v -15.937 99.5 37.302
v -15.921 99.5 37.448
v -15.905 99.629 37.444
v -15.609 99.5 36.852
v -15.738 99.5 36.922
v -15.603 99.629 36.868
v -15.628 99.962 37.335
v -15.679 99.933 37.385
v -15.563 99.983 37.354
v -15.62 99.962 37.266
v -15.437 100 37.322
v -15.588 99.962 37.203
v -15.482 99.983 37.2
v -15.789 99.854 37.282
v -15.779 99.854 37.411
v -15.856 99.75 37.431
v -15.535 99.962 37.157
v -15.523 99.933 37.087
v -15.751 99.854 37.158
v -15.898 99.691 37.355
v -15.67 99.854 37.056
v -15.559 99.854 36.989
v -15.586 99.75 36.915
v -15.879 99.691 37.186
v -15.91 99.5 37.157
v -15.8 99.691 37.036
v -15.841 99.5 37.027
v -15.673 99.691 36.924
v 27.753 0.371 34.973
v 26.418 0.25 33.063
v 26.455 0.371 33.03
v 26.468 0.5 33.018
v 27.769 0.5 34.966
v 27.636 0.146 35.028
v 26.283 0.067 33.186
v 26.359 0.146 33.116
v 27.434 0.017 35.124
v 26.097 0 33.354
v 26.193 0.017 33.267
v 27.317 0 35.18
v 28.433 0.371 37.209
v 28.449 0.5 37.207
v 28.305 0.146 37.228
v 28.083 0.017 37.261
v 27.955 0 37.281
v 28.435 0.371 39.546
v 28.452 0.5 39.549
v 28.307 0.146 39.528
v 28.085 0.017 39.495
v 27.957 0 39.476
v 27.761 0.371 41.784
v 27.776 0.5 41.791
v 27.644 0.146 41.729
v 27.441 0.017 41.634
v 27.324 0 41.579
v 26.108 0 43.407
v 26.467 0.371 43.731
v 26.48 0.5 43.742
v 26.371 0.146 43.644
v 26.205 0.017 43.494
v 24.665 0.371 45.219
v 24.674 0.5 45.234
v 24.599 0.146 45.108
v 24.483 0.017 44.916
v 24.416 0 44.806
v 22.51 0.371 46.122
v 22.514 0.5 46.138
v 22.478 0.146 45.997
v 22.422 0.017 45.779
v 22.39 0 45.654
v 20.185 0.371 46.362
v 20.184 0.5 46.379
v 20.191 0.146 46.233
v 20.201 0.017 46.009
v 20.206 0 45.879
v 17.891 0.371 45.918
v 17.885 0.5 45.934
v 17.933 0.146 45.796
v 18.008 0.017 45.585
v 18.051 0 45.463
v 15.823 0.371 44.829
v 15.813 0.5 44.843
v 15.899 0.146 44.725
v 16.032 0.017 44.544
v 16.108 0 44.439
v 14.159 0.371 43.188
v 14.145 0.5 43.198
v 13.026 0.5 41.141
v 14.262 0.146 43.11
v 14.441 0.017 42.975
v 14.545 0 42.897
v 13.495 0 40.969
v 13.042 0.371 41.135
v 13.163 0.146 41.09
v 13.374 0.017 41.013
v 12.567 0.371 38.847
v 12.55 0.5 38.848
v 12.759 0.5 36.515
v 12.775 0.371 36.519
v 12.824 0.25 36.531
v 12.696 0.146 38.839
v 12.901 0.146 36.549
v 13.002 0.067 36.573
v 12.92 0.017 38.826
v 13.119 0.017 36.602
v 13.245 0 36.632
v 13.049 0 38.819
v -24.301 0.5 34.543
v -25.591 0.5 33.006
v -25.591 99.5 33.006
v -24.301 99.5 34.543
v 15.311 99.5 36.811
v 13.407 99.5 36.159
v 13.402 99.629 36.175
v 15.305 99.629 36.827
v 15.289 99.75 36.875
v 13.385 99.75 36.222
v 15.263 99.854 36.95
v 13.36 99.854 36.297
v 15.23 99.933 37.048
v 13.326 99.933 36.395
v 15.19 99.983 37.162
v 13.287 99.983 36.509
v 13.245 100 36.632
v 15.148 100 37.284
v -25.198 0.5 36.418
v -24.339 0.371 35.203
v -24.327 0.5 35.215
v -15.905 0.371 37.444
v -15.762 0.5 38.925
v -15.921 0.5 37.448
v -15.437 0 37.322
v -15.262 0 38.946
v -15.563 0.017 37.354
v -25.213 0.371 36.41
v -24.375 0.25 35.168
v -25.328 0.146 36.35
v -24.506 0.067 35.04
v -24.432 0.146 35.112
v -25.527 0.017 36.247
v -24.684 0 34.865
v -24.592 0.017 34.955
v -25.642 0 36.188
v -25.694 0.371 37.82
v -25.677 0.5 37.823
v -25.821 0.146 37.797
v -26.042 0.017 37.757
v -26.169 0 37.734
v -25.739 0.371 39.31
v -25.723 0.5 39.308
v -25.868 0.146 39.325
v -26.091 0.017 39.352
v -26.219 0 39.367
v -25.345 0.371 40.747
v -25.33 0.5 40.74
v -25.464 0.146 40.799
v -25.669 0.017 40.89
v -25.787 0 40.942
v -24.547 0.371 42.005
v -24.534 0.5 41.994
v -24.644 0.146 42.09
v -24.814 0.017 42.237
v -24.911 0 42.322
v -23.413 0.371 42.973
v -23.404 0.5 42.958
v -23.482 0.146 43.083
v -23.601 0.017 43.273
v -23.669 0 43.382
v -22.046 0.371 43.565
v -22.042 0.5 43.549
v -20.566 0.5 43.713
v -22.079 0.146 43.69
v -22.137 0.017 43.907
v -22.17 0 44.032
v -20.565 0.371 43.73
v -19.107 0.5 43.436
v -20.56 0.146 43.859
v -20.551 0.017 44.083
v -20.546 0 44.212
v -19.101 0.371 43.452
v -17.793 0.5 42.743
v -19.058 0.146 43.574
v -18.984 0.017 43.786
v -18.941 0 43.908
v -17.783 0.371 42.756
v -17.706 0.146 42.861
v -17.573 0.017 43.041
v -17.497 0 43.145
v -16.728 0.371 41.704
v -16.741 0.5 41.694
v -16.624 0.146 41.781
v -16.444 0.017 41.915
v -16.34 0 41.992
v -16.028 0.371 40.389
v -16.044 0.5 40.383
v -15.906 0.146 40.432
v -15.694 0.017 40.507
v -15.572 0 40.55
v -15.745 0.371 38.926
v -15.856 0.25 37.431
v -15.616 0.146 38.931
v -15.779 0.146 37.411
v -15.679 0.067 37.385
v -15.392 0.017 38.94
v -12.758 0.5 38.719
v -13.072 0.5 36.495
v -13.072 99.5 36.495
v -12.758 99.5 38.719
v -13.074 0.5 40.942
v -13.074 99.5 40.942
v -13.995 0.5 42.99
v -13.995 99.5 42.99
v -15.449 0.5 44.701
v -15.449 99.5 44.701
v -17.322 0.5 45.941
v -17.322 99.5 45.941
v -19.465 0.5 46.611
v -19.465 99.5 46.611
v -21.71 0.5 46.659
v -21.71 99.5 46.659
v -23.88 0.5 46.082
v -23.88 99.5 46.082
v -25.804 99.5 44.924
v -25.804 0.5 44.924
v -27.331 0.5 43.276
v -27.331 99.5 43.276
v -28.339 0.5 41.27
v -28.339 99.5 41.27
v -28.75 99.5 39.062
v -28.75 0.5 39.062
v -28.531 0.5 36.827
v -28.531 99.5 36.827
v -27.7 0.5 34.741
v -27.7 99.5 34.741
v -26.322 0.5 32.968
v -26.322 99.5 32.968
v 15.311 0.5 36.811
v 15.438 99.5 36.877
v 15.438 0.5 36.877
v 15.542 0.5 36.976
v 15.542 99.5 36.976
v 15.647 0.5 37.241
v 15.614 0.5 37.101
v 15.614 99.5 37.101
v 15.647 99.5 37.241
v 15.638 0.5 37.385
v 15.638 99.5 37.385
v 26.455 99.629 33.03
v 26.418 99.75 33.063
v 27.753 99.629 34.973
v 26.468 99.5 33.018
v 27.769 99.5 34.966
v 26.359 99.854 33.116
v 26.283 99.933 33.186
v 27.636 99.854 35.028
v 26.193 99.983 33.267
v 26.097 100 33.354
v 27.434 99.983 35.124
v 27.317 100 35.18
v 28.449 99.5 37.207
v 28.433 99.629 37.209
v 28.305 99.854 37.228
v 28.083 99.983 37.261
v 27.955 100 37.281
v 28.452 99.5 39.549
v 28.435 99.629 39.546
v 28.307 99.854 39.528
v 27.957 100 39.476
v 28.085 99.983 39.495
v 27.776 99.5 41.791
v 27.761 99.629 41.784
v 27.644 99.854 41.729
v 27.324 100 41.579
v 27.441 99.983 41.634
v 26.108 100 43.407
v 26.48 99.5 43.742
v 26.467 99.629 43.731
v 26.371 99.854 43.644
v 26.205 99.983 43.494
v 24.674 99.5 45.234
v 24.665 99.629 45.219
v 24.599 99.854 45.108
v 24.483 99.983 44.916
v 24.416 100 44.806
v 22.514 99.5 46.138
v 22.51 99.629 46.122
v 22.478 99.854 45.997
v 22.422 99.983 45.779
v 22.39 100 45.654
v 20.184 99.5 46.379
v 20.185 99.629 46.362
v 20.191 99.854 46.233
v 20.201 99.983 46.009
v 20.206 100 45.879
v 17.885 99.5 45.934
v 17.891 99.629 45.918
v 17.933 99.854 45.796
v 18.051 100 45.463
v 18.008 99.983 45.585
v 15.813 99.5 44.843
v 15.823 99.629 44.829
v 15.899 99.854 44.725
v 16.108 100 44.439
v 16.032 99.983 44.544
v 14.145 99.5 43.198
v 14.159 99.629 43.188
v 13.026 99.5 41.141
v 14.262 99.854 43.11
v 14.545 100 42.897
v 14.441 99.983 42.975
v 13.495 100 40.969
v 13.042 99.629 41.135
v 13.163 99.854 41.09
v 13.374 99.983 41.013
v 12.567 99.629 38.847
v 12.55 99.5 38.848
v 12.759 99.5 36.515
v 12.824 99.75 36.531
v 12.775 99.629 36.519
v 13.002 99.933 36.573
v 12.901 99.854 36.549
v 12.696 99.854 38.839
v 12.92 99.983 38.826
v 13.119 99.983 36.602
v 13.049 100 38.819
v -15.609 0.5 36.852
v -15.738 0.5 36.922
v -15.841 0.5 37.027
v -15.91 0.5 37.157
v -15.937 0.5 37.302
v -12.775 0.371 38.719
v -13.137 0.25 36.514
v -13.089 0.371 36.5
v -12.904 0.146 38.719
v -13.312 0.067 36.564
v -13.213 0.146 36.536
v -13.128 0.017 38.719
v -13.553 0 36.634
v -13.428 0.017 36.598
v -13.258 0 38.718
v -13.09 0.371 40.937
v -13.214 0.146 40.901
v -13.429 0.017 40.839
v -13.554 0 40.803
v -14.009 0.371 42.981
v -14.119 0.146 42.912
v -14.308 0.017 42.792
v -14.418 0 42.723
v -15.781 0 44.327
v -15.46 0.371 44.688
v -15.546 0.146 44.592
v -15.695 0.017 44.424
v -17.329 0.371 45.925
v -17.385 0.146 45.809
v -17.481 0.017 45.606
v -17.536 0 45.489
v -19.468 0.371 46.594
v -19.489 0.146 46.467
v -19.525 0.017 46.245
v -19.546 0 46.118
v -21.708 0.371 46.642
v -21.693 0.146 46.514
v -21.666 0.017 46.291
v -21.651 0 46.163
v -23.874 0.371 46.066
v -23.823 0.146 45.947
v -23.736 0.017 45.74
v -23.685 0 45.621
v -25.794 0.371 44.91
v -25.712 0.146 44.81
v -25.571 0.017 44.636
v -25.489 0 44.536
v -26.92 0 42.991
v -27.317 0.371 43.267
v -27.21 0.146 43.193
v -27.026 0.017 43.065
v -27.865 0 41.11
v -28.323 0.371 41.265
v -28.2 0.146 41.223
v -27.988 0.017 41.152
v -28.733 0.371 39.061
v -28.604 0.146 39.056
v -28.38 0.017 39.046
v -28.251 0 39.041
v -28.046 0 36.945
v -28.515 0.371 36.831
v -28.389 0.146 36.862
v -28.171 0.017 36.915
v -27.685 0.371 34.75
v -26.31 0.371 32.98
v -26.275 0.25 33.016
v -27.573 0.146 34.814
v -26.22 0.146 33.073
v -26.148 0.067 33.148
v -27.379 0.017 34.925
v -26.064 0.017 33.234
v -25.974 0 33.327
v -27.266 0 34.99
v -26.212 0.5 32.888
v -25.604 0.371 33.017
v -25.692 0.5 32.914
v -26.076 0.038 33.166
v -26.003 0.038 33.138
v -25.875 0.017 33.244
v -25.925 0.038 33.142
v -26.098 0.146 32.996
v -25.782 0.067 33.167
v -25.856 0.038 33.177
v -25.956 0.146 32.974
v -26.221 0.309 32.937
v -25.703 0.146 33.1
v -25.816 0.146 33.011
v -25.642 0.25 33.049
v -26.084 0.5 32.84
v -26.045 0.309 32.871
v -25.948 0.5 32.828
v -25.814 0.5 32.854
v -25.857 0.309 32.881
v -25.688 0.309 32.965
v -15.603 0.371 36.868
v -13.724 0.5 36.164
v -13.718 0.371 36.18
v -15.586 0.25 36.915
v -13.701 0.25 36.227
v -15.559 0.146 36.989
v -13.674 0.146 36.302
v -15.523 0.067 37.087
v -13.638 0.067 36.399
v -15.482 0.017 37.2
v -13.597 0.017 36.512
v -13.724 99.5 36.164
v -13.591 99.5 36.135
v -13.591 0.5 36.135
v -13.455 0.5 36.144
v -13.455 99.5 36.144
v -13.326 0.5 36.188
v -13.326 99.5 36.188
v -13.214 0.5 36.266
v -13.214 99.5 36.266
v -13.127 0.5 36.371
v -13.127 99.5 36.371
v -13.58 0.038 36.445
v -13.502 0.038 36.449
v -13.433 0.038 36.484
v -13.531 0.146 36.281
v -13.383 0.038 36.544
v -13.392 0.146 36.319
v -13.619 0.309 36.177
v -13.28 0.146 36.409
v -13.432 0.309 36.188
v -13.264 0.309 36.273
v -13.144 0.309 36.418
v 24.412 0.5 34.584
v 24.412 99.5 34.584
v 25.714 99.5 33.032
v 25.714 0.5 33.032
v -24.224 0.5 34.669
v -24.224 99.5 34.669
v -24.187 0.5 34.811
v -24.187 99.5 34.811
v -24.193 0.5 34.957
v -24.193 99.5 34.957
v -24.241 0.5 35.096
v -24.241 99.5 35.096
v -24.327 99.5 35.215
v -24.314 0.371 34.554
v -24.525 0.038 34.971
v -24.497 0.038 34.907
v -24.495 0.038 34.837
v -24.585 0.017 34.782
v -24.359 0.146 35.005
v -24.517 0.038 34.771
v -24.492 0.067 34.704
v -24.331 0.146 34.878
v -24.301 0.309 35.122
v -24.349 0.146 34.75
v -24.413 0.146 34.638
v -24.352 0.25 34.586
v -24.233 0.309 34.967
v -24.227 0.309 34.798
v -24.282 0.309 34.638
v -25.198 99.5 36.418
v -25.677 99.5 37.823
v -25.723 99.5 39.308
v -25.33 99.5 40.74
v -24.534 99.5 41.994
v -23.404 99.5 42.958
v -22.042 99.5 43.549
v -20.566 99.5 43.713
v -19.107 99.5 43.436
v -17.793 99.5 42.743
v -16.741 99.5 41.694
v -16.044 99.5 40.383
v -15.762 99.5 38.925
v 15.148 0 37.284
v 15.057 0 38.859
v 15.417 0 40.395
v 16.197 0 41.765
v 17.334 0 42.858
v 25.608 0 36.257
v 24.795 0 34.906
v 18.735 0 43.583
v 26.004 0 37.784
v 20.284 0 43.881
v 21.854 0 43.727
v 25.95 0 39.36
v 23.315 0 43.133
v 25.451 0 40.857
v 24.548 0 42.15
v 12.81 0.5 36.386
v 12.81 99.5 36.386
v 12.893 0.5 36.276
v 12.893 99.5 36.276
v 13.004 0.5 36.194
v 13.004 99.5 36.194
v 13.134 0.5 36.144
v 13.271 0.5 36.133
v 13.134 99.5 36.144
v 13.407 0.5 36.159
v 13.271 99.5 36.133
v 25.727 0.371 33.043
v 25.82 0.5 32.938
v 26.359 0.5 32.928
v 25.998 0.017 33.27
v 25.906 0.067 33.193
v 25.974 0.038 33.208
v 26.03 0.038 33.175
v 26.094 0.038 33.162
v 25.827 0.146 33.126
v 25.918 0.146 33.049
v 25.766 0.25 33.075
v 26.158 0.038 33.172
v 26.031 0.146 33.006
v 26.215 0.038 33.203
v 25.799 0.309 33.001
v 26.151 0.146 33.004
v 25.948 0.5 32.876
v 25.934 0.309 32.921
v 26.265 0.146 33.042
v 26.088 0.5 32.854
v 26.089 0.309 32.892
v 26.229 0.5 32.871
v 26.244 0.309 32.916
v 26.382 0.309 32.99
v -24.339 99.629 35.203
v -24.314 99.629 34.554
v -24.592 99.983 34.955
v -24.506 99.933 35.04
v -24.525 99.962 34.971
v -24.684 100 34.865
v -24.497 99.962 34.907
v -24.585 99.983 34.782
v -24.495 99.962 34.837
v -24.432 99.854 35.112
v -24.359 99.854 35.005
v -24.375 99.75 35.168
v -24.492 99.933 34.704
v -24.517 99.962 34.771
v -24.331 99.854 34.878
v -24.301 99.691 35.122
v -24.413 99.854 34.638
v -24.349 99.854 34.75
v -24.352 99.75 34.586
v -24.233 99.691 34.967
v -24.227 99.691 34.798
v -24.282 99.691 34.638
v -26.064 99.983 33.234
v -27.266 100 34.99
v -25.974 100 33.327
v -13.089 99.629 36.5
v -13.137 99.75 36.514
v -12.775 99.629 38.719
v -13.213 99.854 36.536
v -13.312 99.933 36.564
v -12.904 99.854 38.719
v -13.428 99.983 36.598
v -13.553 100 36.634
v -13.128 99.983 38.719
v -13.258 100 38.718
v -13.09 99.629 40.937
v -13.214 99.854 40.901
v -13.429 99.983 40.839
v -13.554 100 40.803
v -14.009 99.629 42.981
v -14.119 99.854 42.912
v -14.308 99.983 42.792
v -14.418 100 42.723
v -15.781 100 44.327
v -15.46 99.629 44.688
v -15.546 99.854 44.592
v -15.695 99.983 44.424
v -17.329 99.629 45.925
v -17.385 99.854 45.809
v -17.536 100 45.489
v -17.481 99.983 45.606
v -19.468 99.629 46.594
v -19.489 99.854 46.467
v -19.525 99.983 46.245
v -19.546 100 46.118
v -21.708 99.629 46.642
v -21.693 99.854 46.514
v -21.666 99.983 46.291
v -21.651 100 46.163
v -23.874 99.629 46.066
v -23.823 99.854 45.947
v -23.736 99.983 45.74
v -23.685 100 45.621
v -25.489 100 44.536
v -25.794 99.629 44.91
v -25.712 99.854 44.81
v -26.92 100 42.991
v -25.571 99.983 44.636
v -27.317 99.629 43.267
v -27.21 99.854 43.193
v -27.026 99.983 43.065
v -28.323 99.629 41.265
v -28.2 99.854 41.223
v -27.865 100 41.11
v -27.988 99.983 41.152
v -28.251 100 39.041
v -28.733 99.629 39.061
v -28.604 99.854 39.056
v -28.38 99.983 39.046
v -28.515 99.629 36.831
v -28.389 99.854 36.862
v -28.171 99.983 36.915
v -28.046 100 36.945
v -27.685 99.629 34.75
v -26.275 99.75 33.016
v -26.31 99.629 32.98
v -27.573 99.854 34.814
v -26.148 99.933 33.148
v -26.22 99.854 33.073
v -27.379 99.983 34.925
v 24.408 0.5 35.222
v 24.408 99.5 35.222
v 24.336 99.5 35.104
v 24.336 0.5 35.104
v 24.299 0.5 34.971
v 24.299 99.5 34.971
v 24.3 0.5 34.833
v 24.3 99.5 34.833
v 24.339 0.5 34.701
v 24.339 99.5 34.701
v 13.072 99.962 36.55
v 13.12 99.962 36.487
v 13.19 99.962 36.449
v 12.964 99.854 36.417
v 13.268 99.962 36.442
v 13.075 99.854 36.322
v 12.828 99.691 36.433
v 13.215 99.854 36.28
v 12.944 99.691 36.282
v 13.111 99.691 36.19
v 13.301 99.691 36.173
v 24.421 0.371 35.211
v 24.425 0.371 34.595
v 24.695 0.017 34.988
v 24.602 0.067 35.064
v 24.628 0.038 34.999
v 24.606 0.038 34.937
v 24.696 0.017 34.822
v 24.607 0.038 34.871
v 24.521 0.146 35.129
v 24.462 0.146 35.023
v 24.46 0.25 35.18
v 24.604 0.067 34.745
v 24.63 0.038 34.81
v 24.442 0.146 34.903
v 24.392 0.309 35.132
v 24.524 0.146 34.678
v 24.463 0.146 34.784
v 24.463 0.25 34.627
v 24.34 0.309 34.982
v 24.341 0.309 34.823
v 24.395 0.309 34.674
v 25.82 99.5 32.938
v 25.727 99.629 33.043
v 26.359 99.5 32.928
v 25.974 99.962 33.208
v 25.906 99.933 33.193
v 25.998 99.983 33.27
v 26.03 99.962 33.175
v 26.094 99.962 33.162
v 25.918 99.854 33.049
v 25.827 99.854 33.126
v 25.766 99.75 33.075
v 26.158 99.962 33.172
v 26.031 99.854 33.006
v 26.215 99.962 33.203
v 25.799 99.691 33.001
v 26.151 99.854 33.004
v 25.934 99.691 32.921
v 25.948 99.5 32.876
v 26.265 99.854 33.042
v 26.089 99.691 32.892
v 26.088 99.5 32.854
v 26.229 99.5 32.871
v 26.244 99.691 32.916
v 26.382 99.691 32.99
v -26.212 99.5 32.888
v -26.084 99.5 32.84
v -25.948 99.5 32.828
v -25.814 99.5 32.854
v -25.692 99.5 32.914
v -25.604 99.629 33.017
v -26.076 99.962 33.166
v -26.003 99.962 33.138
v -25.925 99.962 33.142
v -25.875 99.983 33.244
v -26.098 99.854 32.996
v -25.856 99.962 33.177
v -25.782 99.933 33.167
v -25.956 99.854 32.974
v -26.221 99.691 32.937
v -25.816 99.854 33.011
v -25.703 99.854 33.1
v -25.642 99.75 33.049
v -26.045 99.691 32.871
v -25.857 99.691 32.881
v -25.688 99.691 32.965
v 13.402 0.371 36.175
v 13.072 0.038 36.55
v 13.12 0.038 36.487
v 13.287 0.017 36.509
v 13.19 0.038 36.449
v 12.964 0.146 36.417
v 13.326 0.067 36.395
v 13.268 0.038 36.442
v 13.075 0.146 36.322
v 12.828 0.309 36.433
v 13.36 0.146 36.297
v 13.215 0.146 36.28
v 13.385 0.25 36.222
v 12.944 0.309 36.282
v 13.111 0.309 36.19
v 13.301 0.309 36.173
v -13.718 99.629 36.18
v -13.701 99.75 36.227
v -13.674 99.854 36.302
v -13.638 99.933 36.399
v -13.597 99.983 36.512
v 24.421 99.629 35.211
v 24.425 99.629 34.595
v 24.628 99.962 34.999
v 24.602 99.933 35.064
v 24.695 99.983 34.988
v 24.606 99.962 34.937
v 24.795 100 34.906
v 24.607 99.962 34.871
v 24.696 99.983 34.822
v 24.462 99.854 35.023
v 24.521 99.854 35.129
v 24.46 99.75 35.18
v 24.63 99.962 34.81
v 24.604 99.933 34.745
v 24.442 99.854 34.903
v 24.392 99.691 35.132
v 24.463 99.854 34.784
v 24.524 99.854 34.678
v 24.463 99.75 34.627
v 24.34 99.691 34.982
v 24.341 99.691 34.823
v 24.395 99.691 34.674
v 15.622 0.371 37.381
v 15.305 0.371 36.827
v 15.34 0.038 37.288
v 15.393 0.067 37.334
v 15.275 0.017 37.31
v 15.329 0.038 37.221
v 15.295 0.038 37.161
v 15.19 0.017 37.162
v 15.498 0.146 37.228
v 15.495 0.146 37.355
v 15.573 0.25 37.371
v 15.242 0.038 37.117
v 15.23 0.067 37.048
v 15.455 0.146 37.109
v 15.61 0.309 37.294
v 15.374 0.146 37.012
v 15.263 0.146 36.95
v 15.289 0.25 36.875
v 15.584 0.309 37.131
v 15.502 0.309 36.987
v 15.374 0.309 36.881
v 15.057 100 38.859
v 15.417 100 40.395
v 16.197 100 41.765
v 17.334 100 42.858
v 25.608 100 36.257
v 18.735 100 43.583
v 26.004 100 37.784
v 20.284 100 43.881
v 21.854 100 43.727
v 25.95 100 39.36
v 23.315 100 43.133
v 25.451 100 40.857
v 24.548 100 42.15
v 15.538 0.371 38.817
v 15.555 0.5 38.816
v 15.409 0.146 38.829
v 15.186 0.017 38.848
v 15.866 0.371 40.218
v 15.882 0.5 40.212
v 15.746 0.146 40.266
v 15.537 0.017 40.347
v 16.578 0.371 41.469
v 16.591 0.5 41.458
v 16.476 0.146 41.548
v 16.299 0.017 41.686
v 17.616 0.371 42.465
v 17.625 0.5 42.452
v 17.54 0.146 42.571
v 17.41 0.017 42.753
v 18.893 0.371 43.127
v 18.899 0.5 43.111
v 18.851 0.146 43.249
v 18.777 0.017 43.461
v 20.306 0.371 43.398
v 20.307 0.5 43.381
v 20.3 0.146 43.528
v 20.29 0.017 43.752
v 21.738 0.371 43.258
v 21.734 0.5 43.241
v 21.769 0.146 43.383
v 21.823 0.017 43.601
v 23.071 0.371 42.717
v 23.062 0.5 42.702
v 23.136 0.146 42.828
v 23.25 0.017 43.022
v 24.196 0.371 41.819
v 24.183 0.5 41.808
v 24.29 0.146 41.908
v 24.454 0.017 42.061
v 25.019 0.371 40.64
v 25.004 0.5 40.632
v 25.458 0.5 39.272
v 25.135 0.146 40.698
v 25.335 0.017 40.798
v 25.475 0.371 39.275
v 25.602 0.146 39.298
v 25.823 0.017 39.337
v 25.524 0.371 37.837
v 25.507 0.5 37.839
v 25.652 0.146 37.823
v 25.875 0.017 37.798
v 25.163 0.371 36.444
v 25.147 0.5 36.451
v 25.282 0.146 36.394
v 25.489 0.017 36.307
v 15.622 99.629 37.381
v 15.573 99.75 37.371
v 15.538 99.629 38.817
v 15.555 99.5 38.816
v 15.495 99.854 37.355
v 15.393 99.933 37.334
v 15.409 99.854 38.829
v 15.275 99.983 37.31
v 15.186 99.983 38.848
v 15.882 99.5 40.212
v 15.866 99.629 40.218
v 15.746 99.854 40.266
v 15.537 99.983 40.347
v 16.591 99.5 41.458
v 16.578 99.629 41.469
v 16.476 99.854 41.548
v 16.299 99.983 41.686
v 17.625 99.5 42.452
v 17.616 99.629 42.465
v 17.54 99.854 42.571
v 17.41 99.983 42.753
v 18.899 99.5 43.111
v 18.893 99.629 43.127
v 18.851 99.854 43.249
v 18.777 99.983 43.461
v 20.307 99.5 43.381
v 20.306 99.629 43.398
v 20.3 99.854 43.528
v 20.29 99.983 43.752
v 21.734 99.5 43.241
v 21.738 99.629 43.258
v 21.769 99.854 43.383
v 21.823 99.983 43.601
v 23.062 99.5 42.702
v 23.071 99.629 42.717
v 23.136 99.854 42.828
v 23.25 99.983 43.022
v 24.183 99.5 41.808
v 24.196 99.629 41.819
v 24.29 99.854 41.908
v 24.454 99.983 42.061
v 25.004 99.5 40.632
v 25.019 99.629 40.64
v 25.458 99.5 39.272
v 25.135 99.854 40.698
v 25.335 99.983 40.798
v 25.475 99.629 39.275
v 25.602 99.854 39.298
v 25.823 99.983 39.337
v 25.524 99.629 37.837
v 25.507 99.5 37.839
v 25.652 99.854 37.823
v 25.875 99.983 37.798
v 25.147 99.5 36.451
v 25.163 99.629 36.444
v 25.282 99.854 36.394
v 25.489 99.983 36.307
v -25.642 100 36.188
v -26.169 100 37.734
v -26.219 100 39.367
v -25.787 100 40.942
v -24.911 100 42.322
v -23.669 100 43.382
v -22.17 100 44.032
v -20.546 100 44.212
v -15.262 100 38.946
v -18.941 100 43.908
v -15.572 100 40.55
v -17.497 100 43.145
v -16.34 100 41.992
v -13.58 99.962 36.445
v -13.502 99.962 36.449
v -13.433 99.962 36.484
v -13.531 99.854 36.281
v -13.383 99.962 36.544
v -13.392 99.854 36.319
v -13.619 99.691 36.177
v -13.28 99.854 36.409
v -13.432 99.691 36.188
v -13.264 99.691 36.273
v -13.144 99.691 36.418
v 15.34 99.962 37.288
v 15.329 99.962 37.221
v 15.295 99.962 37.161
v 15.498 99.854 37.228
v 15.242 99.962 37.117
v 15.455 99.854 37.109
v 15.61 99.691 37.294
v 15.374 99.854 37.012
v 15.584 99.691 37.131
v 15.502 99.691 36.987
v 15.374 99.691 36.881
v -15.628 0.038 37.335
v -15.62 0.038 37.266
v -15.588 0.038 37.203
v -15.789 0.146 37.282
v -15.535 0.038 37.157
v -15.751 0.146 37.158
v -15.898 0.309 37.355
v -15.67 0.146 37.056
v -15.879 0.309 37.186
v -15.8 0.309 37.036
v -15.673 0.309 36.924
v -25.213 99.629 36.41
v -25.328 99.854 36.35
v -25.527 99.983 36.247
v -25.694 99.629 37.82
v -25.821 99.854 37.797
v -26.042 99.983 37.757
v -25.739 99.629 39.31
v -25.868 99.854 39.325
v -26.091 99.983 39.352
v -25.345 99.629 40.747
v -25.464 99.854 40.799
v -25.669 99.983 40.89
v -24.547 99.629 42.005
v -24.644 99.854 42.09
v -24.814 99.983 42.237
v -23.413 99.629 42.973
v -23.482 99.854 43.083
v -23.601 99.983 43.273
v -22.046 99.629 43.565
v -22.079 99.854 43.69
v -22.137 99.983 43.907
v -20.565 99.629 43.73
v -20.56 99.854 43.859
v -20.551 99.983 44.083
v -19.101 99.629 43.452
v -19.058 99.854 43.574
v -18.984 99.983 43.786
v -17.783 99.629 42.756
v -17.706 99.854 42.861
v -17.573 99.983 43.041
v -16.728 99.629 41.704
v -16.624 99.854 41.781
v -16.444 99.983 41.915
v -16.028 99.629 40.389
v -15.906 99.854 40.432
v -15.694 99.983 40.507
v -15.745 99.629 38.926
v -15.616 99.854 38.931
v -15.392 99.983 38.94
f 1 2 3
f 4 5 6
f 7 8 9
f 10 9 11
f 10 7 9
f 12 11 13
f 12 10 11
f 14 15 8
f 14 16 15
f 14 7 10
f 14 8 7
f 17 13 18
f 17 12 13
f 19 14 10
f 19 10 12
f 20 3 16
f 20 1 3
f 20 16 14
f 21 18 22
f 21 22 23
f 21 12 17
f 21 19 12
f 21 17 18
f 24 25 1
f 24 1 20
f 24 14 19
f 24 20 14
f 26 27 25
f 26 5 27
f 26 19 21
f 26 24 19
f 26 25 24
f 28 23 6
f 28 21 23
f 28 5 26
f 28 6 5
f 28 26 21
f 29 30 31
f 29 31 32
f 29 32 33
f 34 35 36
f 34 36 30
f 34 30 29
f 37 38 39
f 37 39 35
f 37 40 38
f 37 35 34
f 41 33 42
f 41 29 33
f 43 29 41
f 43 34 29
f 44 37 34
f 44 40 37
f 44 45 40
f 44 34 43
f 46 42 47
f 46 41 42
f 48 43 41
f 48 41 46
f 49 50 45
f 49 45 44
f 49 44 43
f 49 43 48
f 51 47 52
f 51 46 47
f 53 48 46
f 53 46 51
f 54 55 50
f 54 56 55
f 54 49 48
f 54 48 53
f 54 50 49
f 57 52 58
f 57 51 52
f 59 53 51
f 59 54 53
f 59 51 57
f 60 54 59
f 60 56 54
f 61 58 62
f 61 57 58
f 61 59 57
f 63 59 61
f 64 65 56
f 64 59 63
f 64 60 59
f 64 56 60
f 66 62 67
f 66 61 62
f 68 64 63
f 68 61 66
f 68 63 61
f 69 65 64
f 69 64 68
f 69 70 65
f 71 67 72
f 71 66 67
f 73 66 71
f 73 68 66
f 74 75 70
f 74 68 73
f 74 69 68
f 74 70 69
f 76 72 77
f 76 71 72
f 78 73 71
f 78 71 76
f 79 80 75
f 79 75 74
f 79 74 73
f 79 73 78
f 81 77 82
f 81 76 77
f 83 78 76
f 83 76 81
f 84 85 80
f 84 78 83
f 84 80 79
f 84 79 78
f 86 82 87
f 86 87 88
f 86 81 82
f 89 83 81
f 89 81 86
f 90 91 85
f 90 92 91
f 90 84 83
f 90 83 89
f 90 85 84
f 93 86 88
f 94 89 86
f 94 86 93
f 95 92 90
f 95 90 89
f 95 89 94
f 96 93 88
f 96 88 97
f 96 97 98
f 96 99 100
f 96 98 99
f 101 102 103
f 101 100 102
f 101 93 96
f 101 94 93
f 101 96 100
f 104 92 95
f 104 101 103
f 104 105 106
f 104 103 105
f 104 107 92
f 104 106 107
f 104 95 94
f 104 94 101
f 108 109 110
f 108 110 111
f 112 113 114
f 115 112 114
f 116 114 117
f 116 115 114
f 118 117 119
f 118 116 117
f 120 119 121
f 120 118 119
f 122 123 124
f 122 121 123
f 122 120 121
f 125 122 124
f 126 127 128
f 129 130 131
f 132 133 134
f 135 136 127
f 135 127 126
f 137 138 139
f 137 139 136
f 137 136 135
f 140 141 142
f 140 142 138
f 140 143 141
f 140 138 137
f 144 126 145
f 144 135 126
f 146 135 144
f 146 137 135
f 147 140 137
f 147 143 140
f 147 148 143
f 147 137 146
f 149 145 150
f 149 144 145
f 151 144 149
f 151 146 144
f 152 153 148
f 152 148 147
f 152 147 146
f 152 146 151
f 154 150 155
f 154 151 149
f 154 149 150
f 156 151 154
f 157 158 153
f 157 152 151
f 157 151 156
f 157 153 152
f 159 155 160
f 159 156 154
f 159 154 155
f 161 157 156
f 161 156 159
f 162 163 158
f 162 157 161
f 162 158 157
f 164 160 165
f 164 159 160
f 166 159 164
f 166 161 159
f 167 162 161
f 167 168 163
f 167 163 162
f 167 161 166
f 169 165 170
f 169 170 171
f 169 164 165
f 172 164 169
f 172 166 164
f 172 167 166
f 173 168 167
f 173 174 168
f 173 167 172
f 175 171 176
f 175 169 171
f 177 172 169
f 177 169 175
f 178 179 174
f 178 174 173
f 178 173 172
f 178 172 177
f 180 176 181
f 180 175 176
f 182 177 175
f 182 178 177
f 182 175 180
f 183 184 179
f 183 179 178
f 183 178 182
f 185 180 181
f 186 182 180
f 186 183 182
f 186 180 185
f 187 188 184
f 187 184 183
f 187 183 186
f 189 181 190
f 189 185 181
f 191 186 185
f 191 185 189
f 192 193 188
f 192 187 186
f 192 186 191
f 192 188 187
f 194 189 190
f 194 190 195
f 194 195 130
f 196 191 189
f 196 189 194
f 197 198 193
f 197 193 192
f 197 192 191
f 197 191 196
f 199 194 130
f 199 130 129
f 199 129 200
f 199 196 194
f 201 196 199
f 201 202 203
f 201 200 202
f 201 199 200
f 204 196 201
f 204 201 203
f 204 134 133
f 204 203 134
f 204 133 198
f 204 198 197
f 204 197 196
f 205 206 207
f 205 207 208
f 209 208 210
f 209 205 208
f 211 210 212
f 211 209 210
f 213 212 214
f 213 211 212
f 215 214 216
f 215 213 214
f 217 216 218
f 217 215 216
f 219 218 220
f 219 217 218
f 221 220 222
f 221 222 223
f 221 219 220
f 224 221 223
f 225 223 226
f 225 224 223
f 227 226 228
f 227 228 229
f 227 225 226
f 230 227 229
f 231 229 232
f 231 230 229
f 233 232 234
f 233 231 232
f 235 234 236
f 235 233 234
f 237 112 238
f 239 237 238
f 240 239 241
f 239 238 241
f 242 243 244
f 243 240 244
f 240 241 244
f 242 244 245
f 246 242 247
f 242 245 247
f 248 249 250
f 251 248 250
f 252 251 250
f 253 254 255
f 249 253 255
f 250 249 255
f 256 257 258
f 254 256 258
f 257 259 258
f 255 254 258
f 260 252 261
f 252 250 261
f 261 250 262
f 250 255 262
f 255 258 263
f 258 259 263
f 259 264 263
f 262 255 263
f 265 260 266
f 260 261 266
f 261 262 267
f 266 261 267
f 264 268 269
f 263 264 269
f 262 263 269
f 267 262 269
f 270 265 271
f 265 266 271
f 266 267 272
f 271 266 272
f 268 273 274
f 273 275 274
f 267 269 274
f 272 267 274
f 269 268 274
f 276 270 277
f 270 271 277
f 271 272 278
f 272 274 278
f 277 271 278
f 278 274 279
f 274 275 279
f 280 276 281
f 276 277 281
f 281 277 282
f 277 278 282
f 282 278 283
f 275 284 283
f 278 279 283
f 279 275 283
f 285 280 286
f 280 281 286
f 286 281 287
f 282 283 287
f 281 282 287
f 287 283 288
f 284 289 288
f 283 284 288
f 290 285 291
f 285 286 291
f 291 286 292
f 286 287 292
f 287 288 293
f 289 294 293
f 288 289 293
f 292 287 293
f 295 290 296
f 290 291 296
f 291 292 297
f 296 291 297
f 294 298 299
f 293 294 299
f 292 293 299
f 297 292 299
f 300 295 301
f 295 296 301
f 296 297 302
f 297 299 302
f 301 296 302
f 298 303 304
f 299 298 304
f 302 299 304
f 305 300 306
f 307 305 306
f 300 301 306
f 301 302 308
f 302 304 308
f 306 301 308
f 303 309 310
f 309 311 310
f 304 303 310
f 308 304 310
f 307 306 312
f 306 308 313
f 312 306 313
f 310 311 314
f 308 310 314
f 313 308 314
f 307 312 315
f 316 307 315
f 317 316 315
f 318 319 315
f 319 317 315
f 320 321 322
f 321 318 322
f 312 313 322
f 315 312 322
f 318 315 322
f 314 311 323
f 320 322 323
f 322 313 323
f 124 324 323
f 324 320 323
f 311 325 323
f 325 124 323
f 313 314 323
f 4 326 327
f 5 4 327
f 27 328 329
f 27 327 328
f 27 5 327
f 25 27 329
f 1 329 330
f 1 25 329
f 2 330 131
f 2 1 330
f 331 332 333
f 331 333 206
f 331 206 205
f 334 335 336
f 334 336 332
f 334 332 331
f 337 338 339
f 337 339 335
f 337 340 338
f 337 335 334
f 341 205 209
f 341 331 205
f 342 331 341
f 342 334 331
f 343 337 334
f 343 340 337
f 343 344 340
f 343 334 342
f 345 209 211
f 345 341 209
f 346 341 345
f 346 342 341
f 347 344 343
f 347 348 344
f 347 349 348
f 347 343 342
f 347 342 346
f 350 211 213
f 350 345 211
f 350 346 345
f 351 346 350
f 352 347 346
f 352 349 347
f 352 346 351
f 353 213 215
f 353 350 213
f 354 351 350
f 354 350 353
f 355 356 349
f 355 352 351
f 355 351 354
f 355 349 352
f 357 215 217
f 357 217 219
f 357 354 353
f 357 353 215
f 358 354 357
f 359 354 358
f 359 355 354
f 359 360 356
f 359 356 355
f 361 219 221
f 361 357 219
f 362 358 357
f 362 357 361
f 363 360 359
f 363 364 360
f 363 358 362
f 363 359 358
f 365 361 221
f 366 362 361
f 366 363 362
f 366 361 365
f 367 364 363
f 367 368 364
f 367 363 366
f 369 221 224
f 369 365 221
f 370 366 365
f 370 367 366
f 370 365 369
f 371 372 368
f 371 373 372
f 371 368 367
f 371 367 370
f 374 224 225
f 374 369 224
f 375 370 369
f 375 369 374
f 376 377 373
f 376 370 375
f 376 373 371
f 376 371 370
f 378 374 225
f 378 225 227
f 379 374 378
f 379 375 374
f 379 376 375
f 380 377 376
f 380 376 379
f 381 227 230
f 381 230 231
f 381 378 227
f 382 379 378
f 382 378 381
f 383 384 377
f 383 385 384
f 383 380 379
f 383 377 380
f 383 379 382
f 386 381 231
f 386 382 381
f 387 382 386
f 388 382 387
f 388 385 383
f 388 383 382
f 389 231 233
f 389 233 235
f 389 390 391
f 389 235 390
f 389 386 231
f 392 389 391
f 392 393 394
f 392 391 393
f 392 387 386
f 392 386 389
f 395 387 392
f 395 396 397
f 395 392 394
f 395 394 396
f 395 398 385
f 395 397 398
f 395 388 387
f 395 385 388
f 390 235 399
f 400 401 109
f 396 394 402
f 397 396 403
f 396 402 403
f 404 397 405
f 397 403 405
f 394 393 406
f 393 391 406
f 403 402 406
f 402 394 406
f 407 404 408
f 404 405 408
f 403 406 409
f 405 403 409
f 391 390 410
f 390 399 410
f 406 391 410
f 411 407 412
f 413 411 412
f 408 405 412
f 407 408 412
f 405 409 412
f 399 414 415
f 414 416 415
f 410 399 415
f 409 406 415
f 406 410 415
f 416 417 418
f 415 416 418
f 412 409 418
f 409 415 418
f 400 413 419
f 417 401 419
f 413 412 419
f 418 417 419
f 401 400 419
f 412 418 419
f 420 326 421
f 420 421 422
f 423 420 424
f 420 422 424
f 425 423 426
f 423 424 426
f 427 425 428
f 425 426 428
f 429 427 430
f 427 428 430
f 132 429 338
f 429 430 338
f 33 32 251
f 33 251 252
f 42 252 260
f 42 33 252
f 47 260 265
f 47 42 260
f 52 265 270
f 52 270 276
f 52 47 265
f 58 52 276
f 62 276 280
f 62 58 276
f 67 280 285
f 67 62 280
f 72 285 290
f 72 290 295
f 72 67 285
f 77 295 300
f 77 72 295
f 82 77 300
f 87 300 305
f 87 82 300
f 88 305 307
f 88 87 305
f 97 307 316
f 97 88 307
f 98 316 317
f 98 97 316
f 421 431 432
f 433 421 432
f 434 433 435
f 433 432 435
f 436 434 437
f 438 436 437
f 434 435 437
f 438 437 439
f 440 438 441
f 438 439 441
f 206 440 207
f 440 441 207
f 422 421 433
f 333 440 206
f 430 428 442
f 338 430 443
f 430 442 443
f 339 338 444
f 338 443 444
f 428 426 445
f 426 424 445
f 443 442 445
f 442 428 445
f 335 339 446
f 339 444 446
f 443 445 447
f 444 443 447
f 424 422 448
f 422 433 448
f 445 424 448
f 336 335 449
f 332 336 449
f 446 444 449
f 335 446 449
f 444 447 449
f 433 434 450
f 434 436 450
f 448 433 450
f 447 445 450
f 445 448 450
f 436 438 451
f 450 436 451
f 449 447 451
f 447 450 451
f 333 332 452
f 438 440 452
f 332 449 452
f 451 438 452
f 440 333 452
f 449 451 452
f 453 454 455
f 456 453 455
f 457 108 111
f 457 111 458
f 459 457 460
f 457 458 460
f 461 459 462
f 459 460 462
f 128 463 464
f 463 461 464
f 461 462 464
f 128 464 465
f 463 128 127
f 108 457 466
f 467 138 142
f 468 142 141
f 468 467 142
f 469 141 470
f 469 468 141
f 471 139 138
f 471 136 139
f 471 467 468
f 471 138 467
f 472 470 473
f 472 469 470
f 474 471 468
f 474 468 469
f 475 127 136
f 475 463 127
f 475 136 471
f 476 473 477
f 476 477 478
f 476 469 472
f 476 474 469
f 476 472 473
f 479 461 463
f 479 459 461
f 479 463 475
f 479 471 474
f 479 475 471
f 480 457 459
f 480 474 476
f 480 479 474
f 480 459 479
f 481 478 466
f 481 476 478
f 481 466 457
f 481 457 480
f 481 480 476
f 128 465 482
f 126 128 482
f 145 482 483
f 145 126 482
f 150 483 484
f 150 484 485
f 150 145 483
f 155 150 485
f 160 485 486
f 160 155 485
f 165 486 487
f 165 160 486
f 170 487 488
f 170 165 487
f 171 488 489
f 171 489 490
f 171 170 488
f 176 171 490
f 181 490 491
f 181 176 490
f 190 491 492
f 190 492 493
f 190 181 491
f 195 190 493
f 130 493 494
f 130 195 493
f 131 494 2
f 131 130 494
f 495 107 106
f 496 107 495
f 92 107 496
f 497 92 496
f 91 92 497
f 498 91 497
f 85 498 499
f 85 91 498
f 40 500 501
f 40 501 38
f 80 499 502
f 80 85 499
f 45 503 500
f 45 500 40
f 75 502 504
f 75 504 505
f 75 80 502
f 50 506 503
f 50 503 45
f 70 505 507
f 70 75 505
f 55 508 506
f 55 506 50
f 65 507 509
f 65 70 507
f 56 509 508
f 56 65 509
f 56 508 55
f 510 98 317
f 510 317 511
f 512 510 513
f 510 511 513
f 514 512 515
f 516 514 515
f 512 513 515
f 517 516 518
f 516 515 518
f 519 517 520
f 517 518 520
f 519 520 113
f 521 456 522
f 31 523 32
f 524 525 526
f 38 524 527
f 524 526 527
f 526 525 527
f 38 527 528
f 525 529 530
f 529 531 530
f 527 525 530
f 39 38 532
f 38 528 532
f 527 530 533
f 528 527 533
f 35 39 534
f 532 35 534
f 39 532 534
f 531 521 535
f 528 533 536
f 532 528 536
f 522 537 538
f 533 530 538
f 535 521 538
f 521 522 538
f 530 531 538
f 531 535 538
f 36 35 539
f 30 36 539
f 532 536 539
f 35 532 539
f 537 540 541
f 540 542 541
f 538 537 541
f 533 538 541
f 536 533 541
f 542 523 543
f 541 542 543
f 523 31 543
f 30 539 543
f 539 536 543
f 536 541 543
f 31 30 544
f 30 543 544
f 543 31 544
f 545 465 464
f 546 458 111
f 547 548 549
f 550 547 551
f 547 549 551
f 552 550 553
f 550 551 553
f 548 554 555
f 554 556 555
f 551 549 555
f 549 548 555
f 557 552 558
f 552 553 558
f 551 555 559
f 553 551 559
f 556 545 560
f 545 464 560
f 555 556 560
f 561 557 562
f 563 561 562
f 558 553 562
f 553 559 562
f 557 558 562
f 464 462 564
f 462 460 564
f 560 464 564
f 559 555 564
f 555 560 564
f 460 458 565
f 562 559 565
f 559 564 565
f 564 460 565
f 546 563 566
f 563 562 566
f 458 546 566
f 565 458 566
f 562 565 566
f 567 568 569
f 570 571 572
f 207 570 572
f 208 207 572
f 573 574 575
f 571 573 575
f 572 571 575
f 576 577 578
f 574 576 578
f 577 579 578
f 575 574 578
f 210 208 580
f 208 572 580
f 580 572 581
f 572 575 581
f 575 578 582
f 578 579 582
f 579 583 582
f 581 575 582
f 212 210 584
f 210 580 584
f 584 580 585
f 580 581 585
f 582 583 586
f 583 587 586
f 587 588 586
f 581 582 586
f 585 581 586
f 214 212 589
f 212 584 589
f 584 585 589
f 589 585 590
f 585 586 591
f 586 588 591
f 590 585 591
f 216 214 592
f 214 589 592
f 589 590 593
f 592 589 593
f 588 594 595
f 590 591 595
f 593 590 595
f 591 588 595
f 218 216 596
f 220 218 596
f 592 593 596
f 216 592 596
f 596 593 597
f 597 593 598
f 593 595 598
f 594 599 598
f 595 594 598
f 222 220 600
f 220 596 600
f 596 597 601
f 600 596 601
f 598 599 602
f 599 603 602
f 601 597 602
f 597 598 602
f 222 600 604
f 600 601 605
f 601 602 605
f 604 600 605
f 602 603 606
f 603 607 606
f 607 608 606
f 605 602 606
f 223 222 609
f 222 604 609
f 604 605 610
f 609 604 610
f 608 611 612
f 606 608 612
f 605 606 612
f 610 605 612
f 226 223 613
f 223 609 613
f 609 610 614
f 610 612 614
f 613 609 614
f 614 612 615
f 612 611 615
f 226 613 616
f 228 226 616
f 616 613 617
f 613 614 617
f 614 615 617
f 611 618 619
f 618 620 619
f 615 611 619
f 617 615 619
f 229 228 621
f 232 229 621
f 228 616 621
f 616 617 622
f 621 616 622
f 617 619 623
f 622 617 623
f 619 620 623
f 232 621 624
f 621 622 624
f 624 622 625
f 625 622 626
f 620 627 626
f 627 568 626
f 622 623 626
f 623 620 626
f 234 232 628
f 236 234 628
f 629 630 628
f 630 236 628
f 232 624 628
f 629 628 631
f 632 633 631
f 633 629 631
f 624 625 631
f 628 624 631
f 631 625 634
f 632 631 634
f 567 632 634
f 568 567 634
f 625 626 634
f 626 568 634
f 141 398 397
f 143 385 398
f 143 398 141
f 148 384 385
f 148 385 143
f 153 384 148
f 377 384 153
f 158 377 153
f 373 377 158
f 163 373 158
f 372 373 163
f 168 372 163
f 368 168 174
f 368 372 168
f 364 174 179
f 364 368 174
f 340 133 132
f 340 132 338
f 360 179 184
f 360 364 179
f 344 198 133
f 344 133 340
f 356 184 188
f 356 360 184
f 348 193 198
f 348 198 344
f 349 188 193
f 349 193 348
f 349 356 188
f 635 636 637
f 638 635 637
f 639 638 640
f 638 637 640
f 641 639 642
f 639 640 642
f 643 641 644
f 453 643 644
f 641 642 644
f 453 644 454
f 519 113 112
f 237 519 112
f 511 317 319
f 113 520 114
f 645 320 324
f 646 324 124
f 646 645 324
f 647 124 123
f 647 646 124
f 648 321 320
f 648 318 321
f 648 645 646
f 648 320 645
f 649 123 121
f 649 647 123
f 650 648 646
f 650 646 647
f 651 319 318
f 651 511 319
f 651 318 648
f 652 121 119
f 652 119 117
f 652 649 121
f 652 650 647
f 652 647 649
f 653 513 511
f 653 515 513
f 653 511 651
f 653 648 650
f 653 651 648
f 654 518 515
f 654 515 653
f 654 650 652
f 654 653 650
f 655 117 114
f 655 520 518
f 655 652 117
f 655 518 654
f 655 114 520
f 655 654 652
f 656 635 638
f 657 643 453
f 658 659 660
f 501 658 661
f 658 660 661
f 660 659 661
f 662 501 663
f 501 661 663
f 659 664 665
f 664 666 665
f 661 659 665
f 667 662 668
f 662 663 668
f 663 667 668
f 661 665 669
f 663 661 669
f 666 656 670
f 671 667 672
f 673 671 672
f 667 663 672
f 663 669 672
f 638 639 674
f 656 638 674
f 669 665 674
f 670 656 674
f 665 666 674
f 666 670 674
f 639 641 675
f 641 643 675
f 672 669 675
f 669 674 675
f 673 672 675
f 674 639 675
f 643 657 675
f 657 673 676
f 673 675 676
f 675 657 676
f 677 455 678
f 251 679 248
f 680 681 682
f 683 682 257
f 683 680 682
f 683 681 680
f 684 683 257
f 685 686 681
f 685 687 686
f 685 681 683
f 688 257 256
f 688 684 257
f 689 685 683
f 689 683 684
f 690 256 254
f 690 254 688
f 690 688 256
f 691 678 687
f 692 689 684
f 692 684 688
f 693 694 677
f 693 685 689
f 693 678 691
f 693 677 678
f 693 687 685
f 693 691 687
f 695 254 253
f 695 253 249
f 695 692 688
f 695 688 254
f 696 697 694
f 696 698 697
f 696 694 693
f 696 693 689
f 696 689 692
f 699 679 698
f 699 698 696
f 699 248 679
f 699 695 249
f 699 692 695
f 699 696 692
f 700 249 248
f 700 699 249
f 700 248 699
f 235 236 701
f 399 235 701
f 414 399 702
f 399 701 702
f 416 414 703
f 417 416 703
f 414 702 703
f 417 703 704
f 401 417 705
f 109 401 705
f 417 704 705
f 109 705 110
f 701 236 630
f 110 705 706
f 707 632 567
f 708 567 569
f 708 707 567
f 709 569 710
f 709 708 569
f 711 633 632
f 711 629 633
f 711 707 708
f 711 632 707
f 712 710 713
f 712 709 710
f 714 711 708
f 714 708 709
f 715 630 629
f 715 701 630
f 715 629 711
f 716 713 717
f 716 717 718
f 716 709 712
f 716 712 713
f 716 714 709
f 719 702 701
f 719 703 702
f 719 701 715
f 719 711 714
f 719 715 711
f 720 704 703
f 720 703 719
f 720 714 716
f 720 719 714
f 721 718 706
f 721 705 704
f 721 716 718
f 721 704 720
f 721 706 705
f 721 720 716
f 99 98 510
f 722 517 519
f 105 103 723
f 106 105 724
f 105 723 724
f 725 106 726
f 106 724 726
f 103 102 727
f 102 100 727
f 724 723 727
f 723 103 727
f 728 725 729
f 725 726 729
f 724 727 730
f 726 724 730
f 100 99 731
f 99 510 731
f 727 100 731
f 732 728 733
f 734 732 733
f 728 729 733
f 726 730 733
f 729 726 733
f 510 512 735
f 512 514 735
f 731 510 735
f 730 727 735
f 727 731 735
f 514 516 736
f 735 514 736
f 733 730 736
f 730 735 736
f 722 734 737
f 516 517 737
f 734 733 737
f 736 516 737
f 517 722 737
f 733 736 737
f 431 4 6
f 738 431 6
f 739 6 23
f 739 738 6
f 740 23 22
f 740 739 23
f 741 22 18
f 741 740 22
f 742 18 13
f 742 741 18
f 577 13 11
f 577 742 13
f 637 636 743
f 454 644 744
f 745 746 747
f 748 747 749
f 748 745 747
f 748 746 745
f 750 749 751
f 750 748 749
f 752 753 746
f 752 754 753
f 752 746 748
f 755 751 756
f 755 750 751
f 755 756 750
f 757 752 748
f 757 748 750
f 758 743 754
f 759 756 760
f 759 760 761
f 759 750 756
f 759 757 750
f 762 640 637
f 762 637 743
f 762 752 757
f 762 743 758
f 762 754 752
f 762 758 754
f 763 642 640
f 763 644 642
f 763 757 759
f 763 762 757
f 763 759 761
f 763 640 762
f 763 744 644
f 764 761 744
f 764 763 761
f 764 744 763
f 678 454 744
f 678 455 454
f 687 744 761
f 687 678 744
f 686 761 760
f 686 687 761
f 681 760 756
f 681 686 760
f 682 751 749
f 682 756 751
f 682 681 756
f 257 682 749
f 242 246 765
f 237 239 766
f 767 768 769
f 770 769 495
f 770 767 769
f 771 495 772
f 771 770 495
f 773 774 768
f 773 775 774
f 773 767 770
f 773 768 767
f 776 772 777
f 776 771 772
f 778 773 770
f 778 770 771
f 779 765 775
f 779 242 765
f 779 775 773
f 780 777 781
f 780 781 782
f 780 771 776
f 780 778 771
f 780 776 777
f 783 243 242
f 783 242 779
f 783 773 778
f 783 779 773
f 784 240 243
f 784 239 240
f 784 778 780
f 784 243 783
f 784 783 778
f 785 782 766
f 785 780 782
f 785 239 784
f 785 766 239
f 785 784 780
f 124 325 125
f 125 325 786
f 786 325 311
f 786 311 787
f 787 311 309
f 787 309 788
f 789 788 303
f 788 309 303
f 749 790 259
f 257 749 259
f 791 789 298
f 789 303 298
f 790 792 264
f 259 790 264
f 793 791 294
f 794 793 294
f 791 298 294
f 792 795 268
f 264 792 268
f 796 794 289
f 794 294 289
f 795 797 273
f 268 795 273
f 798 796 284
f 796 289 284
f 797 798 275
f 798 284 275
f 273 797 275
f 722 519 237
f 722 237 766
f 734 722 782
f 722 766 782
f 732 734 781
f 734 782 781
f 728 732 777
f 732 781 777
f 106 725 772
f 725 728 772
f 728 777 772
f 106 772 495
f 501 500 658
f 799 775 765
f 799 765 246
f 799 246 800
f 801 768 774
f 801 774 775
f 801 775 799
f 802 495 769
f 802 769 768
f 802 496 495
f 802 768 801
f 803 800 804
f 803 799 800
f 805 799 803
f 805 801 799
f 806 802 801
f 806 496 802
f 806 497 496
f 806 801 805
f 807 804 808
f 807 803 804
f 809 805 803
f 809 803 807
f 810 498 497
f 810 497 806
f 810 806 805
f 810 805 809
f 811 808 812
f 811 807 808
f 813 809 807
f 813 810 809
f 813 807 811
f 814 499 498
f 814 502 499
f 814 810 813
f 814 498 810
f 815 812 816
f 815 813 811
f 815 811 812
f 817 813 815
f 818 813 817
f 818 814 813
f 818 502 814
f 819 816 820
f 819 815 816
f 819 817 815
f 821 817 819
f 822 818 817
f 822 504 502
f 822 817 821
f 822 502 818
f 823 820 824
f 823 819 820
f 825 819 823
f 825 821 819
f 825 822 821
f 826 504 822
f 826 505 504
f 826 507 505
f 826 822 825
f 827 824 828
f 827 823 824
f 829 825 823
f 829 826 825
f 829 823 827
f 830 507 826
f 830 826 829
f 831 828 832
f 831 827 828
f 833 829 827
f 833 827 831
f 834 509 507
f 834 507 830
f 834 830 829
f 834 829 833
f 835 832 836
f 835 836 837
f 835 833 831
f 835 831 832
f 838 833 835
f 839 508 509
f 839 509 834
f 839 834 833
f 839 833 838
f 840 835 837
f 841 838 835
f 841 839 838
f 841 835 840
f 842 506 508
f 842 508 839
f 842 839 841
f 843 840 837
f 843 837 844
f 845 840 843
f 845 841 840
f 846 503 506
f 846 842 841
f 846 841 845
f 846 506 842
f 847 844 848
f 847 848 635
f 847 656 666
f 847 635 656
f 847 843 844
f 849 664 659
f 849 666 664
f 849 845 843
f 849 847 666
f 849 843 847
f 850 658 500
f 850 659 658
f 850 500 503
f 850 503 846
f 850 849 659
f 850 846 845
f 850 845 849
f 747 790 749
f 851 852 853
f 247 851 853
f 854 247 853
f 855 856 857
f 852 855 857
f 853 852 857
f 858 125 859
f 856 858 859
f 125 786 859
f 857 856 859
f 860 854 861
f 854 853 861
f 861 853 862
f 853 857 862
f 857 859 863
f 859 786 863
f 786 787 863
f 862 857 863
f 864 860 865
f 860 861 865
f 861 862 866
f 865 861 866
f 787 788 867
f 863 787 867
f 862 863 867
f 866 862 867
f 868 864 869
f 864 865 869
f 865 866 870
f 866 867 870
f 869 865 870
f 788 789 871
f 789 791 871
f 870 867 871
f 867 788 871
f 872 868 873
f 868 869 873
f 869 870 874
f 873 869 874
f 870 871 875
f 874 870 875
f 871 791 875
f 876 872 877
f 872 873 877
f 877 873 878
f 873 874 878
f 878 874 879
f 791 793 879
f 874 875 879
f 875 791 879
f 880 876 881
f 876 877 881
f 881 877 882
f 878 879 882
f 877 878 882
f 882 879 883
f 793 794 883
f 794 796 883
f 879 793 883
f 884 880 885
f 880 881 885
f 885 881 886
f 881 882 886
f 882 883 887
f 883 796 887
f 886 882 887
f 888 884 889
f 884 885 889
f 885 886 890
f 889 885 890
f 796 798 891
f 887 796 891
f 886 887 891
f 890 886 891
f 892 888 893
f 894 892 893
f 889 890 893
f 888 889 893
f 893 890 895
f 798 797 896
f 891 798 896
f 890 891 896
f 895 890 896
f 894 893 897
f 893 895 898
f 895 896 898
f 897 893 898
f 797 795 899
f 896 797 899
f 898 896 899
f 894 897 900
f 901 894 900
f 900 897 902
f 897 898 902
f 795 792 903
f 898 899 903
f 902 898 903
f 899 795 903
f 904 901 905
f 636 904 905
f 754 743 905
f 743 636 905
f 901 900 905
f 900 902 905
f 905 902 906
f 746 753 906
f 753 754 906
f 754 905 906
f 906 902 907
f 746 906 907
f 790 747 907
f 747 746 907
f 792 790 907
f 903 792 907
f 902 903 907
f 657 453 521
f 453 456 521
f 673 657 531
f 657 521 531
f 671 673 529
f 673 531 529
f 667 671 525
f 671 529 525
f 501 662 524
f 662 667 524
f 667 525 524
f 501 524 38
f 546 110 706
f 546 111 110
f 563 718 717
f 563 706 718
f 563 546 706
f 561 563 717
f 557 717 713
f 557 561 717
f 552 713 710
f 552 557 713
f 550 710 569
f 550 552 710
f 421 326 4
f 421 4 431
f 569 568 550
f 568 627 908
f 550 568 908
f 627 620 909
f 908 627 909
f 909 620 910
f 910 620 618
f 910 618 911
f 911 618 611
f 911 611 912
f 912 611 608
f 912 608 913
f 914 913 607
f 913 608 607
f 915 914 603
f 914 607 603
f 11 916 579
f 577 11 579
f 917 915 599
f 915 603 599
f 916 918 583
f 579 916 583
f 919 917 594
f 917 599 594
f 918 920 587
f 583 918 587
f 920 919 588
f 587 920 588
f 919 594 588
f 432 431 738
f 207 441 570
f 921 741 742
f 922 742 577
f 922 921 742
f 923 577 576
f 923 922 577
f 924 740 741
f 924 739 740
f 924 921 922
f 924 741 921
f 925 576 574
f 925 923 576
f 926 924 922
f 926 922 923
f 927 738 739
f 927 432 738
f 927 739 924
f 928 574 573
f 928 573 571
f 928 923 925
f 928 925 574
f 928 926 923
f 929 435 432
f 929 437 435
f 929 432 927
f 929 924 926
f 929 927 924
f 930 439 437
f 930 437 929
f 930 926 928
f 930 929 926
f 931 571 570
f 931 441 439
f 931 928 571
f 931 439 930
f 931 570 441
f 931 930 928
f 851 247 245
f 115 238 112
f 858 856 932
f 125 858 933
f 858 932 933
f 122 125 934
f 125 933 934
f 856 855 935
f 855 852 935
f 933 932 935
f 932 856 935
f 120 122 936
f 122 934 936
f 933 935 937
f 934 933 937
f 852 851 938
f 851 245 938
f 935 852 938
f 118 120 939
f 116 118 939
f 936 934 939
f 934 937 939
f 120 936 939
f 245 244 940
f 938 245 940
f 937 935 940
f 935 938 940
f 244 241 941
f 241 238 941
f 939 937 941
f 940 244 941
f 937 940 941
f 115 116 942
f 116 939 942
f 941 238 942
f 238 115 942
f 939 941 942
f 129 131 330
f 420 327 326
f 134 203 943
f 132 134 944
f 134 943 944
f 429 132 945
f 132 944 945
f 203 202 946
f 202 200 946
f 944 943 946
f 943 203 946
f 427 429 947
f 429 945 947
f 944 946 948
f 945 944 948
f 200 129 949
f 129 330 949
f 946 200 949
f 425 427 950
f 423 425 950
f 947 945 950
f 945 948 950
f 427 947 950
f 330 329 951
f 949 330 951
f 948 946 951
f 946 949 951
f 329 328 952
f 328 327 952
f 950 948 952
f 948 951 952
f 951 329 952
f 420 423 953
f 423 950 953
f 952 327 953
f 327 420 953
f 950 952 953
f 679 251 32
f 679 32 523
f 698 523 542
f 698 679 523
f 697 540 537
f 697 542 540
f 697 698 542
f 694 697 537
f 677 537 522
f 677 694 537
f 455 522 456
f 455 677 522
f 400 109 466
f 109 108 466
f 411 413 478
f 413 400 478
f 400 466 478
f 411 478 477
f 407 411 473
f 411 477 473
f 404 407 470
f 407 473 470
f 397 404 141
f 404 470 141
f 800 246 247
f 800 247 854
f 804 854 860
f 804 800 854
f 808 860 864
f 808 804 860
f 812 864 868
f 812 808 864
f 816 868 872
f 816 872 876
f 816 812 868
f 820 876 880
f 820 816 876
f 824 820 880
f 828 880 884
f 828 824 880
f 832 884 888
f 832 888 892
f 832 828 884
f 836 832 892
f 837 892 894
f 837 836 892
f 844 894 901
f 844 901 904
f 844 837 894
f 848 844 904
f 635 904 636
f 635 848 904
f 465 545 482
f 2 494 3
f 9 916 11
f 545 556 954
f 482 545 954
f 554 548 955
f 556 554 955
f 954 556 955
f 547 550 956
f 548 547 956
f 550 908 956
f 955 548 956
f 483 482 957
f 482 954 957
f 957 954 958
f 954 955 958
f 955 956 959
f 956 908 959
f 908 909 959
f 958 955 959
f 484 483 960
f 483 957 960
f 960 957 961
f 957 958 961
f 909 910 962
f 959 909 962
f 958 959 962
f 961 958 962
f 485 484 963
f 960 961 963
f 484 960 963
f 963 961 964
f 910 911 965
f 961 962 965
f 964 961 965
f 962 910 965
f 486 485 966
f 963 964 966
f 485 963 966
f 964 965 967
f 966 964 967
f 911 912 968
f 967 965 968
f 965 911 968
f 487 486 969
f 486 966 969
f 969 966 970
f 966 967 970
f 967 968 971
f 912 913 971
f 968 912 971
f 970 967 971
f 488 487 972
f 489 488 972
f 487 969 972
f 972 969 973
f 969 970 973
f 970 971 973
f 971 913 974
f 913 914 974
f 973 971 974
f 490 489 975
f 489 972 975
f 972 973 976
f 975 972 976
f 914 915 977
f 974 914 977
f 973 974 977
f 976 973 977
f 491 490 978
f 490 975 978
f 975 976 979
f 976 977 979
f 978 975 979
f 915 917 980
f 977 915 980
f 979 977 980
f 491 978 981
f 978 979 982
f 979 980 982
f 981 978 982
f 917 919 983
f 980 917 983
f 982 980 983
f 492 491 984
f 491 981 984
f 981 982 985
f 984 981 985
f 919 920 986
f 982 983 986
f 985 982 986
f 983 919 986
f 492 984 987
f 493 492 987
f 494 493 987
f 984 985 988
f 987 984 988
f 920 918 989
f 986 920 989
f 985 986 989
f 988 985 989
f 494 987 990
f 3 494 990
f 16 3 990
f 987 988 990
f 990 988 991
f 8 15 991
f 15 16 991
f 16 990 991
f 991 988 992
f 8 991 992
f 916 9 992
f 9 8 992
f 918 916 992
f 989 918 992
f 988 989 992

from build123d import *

# Parameters (mm, degrees)
F1_DEPTH = 100
F2_R     = 0.5


with BuildPart() as f1:
    # F0 (on Front) → F1 (new body)
    with BuildSketch(Plane.XZ):
        with BuildLine():
            Line((-16.055959, 37.015076), (-13.237687, 35.986784))
            ThreePointArc((-13.237687, 35.986784), (-22.816162, 46.44688), (-25.924482, 32.608559))
            Line((-25.924482, 32.608559), (-23.996094, 34.906722))
            ThreePointArc((-23.996094, 34.906722), (-22.04085, 43.548793), (-16.055959, 37.015076))
        make_face()
        with BuildLine():
            ThreePointArc((26.069842, 32.608559), (22.525334, 46.135543), (12.905276, 35.986784))
            Line((12.905276, 35.986784), (15.744645, 36.960136))
            ThreePointArc((15.744645, 36.960136), (21.72114, 43.244333), (24.134812, 34.914638))
            Line((24.134812, 34.914638), (26.069842, 32.608559))
        make_face()
    extrude(amount=-F1_DEPTH)

    # F2
    f2_edges = [f1.edges().sort_by_distance(p)[0] for p in [
        (-22.04085, 0, 43.548793),
        (-14.646823, 0, 36.50093),
        (-22.816162, 0, 46.44688),
        (-24.960288, 0, 33.75764),
        (21.72114, 0, 43.244333),
        (25.102327, 0, 33.761598),
        (22.525334, 0, 46.135543),
        (14.32496, 0, 36.47346),
        (21.72114, 100, 43.244333),
        (25.102327, 100, 33.761598),
        (22.525334, 100, 46.135543),
        (14.32496, 100, 36.47346),
        (-22.04085, 100, 43.548793),
        (-14.646823, 100, 36.50093),
        (-22.816162, 100, 46.44688),
        (-24.960288, 100, 33.75764),
        (-25.924482, 50, 32.608559),
        (-23.996094, 50, 34.906722),
        (-16.055959, 50, 37.015076),
        (-13.237687, 50, 35.986784),
        (12.905276, 50, 35.986784),
        (15.744645, 50, 36.960136),
        (24.134812, 50, 34.914638),
        (26.069842, 50, 32.608559),
    ]]
    fillet(f2_edges, radius=F2_R)


solid = f1.part
